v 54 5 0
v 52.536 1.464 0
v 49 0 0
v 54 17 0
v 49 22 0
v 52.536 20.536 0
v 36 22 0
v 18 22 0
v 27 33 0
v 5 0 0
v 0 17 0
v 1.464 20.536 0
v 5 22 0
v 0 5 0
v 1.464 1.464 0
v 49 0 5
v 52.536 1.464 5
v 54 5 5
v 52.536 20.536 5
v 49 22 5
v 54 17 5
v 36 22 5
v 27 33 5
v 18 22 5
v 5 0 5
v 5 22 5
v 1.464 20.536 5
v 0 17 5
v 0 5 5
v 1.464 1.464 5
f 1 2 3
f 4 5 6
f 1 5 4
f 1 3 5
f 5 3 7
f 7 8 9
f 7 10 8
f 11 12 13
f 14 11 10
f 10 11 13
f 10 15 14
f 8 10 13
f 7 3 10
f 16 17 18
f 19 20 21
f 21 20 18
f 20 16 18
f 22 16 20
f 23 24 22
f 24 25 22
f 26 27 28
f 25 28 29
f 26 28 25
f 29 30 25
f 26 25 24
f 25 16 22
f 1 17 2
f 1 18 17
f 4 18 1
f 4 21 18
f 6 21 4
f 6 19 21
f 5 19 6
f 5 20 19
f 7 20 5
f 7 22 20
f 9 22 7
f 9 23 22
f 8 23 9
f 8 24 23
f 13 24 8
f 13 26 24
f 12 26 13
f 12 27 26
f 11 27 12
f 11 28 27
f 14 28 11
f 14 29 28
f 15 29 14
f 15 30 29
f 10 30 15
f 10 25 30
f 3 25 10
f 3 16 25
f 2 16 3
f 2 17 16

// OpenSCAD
$fn = 32;

// ----------------------------------------------------------------------
// Ratchet pawl: 54 x 22 mm body, beak 11 mm сверху
// ----------------------------------------------------------------------

// --- parameters (mm) ---
profile_height = 5;       // extrusion height
profile_points = 15;      // points of the closed outline

profile = [[0, 5], [1.464, 1.464], [5, 0], [49, 0], [52.536, 1.464], [54, 5], [54, 17], [52.536, 20.536], [49, 22], [36, 22], [27, 33], [18, 22], [5, 22], [1.464, 20.536], [0, 17]];  // single closed polygon, 15 points, counter clockwise

// --- the one profile operation ---
linear_extrude(height = profile_height) polygon(points = profile);
